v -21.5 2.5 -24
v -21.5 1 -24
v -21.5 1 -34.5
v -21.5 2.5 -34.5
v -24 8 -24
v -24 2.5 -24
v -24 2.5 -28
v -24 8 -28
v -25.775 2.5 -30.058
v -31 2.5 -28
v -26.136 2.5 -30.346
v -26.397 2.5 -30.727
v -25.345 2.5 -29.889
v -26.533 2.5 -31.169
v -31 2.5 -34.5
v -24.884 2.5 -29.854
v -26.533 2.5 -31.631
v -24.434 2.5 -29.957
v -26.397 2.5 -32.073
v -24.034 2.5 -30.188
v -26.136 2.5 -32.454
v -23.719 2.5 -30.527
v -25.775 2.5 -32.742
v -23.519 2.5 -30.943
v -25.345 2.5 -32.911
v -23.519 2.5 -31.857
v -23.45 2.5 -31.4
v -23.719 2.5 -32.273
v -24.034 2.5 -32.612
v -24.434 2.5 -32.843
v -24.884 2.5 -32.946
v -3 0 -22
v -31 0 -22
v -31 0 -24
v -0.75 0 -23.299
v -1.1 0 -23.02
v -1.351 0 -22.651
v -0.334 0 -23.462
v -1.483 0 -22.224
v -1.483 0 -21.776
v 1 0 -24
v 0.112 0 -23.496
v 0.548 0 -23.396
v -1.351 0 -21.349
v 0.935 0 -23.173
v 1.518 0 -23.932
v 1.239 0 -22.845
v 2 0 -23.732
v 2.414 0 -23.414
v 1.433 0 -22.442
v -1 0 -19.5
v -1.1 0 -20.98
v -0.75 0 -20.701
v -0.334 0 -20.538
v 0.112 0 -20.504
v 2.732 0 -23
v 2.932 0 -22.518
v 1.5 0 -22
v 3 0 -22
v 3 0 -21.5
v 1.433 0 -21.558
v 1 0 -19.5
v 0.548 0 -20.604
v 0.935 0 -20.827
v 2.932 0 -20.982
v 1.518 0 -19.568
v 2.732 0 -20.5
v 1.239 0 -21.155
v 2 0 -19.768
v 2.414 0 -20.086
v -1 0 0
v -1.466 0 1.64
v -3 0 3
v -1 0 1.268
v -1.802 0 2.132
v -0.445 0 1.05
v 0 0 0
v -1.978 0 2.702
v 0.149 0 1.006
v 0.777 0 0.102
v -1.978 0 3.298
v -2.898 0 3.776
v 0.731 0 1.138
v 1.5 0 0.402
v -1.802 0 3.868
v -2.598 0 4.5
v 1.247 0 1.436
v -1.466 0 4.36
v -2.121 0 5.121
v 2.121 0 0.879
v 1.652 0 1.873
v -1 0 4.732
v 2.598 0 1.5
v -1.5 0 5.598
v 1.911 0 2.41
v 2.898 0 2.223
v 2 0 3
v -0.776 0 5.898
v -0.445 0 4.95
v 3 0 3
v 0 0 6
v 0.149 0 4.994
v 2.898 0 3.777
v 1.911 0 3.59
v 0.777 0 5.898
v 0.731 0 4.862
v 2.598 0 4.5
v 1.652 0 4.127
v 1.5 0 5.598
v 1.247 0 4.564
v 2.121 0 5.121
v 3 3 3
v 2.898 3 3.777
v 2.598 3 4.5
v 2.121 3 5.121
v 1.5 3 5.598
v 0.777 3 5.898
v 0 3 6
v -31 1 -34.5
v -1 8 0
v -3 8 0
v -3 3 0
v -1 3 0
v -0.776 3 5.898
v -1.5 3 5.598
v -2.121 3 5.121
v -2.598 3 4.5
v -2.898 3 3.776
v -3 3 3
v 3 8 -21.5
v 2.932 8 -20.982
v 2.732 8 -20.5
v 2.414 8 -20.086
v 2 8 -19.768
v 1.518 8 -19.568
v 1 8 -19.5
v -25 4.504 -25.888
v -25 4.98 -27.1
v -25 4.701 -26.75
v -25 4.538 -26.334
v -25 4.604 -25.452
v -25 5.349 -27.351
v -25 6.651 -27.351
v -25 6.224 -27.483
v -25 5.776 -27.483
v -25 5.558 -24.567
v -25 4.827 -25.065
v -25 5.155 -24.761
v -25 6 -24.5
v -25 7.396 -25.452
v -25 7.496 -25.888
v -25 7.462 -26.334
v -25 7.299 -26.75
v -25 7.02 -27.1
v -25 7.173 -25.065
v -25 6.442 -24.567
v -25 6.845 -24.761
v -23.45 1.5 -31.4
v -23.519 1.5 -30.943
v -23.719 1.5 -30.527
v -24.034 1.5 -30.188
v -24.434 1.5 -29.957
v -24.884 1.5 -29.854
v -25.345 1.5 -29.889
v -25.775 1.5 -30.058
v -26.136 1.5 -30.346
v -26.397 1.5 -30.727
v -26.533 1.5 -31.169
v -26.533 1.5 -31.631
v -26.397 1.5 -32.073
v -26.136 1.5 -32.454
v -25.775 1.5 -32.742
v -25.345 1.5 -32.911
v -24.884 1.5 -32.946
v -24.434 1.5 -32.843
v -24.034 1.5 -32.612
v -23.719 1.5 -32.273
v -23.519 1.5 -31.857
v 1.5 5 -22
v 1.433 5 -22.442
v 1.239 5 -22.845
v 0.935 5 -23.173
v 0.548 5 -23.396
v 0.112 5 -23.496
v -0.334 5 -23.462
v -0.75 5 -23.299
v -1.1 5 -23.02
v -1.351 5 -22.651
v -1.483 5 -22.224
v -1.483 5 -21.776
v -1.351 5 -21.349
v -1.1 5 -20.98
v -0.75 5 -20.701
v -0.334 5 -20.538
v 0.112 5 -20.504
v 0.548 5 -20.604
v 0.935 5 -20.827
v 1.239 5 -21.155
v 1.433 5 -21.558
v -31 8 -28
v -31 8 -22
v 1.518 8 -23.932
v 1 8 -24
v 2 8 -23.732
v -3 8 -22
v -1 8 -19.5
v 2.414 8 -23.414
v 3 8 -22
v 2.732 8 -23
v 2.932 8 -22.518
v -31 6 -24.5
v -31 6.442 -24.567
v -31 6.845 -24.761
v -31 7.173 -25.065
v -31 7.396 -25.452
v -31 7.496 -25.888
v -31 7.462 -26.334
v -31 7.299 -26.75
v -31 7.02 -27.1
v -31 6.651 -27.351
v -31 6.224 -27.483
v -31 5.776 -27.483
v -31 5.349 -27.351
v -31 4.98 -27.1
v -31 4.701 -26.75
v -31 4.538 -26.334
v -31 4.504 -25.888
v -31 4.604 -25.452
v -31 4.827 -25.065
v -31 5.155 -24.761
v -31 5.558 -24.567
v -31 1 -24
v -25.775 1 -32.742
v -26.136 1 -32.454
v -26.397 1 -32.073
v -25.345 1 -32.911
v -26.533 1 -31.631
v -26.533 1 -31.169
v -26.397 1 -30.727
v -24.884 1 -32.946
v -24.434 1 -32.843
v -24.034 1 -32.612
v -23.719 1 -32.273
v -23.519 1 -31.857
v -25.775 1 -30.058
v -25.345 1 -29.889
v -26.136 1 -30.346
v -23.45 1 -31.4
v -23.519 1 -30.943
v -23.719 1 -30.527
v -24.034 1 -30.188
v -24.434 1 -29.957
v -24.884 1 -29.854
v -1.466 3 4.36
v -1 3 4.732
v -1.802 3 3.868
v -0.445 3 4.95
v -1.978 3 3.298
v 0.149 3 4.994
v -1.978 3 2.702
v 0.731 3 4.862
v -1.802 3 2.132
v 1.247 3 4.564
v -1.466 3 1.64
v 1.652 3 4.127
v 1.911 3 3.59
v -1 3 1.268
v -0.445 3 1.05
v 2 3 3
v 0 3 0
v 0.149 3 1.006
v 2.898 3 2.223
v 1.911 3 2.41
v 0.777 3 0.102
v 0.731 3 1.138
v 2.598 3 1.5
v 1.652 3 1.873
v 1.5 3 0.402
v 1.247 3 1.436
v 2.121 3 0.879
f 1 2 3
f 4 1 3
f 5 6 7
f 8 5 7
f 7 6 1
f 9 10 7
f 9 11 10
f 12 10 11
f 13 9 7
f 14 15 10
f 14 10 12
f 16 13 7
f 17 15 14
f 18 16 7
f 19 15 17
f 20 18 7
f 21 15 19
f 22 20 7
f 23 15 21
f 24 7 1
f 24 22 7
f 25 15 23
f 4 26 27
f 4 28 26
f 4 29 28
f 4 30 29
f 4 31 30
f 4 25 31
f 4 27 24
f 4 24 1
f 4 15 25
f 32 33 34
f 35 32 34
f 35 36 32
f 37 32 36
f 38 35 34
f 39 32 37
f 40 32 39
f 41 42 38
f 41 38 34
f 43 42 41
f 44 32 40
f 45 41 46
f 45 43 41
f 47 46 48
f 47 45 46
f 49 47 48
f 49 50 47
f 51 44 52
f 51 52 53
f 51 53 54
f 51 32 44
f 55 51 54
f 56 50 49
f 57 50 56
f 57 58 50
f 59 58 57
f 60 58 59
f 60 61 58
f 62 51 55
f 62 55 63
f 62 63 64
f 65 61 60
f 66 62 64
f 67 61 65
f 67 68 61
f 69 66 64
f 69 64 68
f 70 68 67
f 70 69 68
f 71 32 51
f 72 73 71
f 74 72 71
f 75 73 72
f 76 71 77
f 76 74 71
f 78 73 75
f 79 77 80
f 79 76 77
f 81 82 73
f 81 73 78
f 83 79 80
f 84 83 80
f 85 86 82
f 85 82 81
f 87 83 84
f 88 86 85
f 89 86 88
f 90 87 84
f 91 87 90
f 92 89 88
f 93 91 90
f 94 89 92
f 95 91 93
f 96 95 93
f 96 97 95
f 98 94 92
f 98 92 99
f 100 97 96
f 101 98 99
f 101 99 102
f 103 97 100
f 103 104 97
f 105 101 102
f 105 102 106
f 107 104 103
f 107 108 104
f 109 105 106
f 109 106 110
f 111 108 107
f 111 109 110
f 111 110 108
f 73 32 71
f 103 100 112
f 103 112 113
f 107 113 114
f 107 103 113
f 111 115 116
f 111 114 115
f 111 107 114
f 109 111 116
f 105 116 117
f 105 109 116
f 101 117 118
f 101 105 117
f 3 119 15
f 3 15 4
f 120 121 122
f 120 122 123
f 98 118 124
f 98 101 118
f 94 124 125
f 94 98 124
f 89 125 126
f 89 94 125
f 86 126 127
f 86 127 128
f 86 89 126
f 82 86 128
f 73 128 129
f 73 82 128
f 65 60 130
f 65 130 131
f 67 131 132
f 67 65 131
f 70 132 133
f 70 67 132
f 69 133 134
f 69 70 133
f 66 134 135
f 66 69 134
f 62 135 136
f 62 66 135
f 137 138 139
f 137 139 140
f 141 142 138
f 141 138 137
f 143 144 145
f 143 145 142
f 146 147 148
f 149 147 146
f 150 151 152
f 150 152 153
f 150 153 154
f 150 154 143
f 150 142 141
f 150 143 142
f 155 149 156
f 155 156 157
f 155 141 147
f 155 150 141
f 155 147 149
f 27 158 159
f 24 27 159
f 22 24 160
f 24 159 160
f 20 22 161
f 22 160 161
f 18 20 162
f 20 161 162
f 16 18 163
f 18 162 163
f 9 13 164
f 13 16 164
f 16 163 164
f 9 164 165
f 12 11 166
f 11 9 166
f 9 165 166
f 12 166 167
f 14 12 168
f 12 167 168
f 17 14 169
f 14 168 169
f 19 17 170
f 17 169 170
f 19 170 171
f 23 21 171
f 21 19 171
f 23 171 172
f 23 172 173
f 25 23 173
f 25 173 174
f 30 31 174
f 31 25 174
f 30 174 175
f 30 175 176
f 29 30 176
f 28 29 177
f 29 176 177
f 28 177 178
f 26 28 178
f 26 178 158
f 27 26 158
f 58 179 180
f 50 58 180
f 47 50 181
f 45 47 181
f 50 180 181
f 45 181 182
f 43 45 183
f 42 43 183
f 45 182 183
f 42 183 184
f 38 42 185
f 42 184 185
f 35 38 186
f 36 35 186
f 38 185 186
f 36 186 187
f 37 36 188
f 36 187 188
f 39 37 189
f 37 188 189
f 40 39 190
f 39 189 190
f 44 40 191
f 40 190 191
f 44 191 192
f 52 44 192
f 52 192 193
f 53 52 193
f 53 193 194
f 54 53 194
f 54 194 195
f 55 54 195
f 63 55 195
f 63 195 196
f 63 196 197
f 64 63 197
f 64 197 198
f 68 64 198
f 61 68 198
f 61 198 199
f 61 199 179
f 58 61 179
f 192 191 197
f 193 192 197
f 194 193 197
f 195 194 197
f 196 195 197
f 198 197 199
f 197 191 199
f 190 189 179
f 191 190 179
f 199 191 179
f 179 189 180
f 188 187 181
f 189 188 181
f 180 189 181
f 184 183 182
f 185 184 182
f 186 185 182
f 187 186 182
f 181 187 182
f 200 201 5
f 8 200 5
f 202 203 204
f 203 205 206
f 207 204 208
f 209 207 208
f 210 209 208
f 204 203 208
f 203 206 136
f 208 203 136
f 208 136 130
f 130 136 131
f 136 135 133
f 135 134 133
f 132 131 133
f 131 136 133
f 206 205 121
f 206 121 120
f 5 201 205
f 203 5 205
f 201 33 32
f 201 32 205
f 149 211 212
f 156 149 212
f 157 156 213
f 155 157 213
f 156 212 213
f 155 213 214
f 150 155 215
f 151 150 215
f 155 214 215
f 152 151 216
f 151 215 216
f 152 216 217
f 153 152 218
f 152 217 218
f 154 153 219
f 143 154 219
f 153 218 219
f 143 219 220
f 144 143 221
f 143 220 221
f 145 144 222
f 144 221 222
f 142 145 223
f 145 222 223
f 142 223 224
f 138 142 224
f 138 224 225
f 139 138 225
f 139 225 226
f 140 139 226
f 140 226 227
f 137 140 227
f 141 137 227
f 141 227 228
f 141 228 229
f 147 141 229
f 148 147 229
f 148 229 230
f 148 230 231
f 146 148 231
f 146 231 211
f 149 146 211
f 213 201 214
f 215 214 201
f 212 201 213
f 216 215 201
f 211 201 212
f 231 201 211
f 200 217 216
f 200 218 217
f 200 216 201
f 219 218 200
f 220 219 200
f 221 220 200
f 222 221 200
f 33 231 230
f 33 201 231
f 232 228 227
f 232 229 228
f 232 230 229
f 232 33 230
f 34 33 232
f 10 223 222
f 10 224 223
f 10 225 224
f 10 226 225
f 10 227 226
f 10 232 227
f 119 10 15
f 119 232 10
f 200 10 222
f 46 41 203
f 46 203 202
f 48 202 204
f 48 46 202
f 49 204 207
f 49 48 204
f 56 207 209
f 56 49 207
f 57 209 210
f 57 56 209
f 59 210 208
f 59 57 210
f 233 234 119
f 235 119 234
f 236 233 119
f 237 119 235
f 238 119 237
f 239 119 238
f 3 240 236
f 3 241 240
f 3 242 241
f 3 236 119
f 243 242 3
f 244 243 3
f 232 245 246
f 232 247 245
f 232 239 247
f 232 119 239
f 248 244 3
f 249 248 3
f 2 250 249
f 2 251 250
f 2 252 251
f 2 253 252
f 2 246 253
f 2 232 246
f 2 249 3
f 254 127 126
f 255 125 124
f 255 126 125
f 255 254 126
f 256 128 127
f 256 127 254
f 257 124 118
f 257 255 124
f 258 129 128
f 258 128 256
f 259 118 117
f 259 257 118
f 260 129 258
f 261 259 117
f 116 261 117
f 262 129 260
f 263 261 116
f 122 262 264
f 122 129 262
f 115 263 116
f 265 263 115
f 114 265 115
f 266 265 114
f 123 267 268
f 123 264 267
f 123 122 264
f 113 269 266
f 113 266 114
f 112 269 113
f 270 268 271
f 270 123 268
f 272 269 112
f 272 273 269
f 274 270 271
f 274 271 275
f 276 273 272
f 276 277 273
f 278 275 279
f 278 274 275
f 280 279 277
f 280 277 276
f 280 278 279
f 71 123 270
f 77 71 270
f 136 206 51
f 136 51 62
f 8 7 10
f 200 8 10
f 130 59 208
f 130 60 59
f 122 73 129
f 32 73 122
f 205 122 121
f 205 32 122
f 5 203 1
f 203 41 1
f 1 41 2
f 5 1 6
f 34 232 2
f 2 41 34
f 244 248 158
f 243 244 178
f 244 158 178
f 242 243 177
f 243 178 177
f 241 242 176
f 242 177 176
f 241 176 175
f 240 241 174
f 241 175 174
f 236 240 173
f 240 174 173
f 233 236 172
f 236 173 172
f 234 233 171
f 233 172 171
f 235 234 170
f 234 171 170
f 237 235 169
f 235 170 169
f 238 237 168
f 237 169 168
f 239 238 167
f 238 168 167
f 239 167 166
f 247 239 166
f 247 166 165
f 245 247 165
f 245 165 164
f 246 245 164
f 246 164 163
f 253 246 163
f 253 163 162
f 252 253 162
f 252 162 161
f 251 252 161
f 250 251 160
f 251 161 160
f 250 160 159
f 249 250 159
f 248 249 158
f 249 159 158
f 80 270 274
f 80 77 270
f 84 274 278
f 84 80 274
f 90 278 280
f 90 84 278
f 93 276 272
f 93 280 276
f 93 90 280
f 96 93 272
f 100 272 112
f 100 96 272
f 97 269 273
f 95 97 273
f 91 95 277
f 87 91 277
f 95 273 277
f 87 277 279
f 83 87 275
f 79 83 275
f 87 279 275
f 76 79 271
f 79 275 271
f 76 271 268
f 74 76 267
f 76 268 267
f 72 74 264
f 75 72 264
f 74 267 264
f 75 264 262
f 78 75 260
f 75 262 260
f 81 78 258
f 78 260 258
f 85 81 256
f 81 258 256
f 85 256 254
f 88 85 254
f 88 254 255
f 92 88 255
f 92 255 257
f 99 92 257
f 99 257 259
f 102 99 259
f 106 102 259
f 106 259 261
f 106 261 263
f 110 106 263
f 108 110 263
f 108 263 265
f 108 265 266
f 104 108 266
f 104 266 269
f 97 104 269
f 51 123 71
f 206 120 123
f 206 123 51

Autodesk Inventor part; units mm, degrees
ref_plane "YZ Plane" through (0, 0, 0) normal (1, 0, 0) x (0, 1, 0)
ref_plane "XZ Plane" through (0, 0, 0) normal (0, 1, 0) x (-1, 0, 0)
ref_plane "XY Plane" through (0, 0, 0) normal (0, 0, 1) x (1, 0, 0)
sketch "Szkic1" plane through (0, 0, 0) normal (0, 1, 0) x (-1, 0, 0)
  line L0 (0, 0) -> (3, 0)
  line L1 (3, 0) -> (3, -25)
  line L2 (3, -25) -> (0, -25)
  line L3 (0, -25) -> (0, 0)
  line L4 (3, -25) -> (31, -25)
  line L5 (31, -25) -> (31, -22)
  line L6 (31, -22) -> (3, -22)
  line L7 (3, -22) -> (3, -25)
  point P0 (3, -22)
  dimension "d0" = 3
  dimension "d1" = 25
  dimension "d2" = 28
  dimension "d3" = 3
extrude "Wyciągnięcie proste1" add sketch "Szkic1" along normal blind 8
sketch "Szkic2" plane through (0, 0, 0) normal (1, 0, 0) x (0, 0, -1)
  line L0 (0, 0) -> (0, 8) projected
  line L1 (0, 8) -> (5, 8)
  line L2 (5, 8) -> (5, 0)
  line L3 (5, 0) -> (0, 0)
  line L4 (0, 0) -> (0, 8)
  dimension "d6" = 5
  dimension "d7" = 8
extrude "Wyciągnięcie proste2" add sketch "Szkic2" along normal blind 3
sketch "Szkic6" plane through (0, 8, 0) normal (0, 1, 0) x (1, 0, 0)
  line L0 (-31, 22) -> (-3, 22) projected
  line L1 (0, 25) -> (-31, 25) projected
  line L2 (-3, 22) -> (0, 22)
  line L3 (0, 22) -> (0, 25)
  line L4 (0, 25) -> (-3, 25)
  line L5 (-3, 25) -> (-3, 22)
  line L6 (-3, 25) -> (3, 25)
  line L7 (3, 25) -> (3, 19)
  line L8 (3, 19) -> (-3, 19)
  line L9 (-3, 19) -> (-3, 25)
  point P0 (0, 0)
  dimension "d19" = 6
  dimension "d20" = 6
extrude "Wyciągnięcie proste6" add sketch "Szkic6" against normal blind 8 contours L6 L7 L8 L9 L2 L3
sketch "Szkic7" plane through (0, 8, 0) normal (0, 1, 0) x (1, 0, 0)
  line L0 (3, 19) -> (3, 25) projected
  line L1 (-31, 25) -> (3, 25) projected
  line L2 (-3, 22) -> (-3, 0) projected
  circle A0 centre (0, 22) radius 1.5
  point P0 (0, 0)
  dimension "d23" = 3
  dimension "d42" = 3
  dimension "d43" = 3
extrude "Wyciągnięcie proste7" cut sketch "Szkic7" against normal blind 8
sketch "Szkic8" plane through (0, 8, 0) normal (0, 1, 0) x (1, 0, 0)
  circle A0 centre (0, 22) radius 1.5 projected
  circle A1 centre (0, 22) radius 2
  point P0 (0, 0)
extrude "Wyciągnięcie proste8" add sketch "Szkic8" against normal blind 3 contours A0
sketch "Szkic9" plane through (0, 8, 0) normal (0, 1, 0) x (1, 0, 0)
  line L0 (-31, 25) -> (-31, 22) projected
  line L1 (3, 19) -> (3, 25) projected
  line L2 (-31, 25) -> (3, 25)
  line L3 (3, 25) -> (3, 24)
  line L4 (3, 24) -> (-31, 24)
  line L5 (-31, 24) -> (-31, 25)
  point P0 (0, 0)
  dimension "d28" = 1
extrude "Wyciągnięcie proste9" cut sketch "Szkic9" against normal blind 8
sketch "Szkic10" plane through (0, 0, -5) normal (0, 0, -1) x (-1, 0, 0)
  line L0 (0, 0) -> (0, 8) projected
  line L1 (-3, 8) -> (-3, 0) projected
  line L2 (0, 0) -> (-3, 0)
  line L3 (-3, 0) -> (-3, 8)
  line L4 (-3, 8) -> (0, 8)
  line L5 (0, 8) -> (0, 0)
  point P0 (-3, 0)
extrude "Wyciągnięcie proste10" cut sketch "Szkic10" against normal blind 3.7
sketch "Szkic11" plane through (0, 8, -19) normal (0, 0, 1) x (1, 0, 0)
  line L0 (-3, 0) -> (3, 0) projected
  line L1 (3, -8) -> (0, -8) projected
  line L2 (0, 0) -> (3, 0)
  line L3 (3, 0) -> (3, -8)
  line L4 (3, -8) -> (0, -8)
  line L5 (0, -8) -> (0, 0)
extrude "Wyciągnięcie proste11" cut sketch "Szkic11" against normal blind 0.5
sketch "Szkic12" plane through (3, 8, -24) normal (0, 0, -1) x (-1, 0, 0)
  line L0 (0, -8) -> (0, 0) projected
  line L1 (6, 0) -> (0, 0) projected
  line L2 (0, -8) -> (6, -8)
  line L3 (6, -8) -> (6, 0)
  line L4 (6, 0) -> (0, 0)
  line L5 (0, 0) -> (0, -8)
  point P0 (3, -8)
extrude "Wyciągnięcie proste12" add sketch "Szkic12" along normal blind 0.5
sketch "Szkic13" plane through (0, 0, -1.3) normal (1, 0, 0) x (0, 0, -1)
  line L0 (0, 0) -> (18.2, 0) projected
  line L1 (0, 8) -> (18.2, 8) projected
  line L2 (0, 0) -> (18.2, 0)
  line L3 (18.2, 0) -> (18.2, 8)
  line L4 (18.2, 8) -> (0, 8)
  line L5 (0, 8) -> (0, 0)
  point P0 (-1.3, 0)
  point P1 (18.2, 0)
extrude "Wyciągnięcie proste13" cut sketch "Szkic13" against normal blind 1
sketch "Szkic14" plane through (3, 8, -24.5) normal (0, 0, -1) x (-1, 0, 0)
  line L0 (4, 0) -> (0, 0) projected
  line L1 (6, -8) -> (6, 0) projected
  line L2 (0, 0) -> (6, 0)
  line L3 (6, 0) -> (6, -8)
  line L4 (6, -8) -> (0, -8)
  line L5 (0, -8) -> (0, 0)
  point P0 (3, -8)
extrude "Wyciągnięcie proste14" cut sketch "Szkic14" against normal blind 0.5
sketch "Szkic15" plane through (-3, 0, 0) normal (0, 0, 1) x (1, 0, 0)
  line L0 (6, 8) -> (6, 0) projected
  line L1 (0, 0) -> (0, 8) projected
  line L2 (6, 8) -> (0, 8)
  line L3 (0, 8) -> (0, 0)
  line L4 (0, 0) -> (6, 0)
  line L5 (6, 0) -> (6, 8)
  point P0 (3, 0)
extrude "Wyciągnięcie proste15" add sketch "Szkic15" along normal blind 4.7
sketch "Szkic16" plane through (3, 0, 0) normal (1, 0, 0) x (0, 0, -1)
  line L0 (-4.7, 8) -> (-4.7, 0) projected
  line L1 (1.3, 0) -> (1.3, 8) projected
  line L2 (-4.7, 0) -> (1.3, 0)
  line L3 (1.3, 0) -> (1.3, 8)
  line L4 (1.3, 8) -> (-4.7, 8)
  line L5 (-4.7, 8) -> (-4.7, 0)
  point P0 (0, 0)
extrude "Wyciągnięcie proste16" cut sketch "Szkic16" against normal blind 4
sketch "Szkic17" plane through (0, 8, 0) normal (0, 1, 0) x (1, 0, 0)
  line L0 (-1, 19.5) -> (-1, -4.7) projected
  line L1 (-3, -4.7) -> (-1, -4.7)
  line L2 (-1, -4.7) -> (-1, 0)
  line L3 (-1, 0) -> (-3, 0)
  line L4 (-3, 0) -> (-3, -4.7)
  line L5 (-3, 0) -> (3, 0)
  line L6 (3, 0) -> (3, -6)
  line L7 (3, -6) -> (-3, -6)
  line L8 (-3, -6) -> (-3, 0)
  point P0 (0, 0)
  dimension "d48" = 6
  dimension "d49" = 6
extrude "Wyciągnięcie proste17" cut sketch "Szkic17" against normal blind 5
sketch "Szkic18" plane through (0, 3, 0) normal (0, 1, 0) x (1, 0, 0)
  line L0 (-3, 0) -> (-1, 0) projected
  line L1 (-3, 0) -> (3, 0)
  line L2 (3, 0) -> (3, -6)
  line L3 (3, -6) -> (-3, -6)
  line L4 (-3, -6) -> (-3, 0)
  point P0 (0, 0)
  dimension "d52" = 6
  dimension "d53" = 6
extrude "Wyciągnięcie proste18" add sketch "Szkic18" against normal blind 3
sketch "Szkic19" plane through (0, 3, 0) normal (0, 1, 0) x (1, 0, 0)
  circle A0 centre (0, -3) radius 2
  line L0 (-3, -6) -> (-3, 0) projected
  line L1 (-3, -6) -> (3, -6) projected
  point P0 (0, 0)
  dimension "d56" = 4
  dimension "d57" = 3
  dimension "d58" = 3
extrude "Wyciągnięcie proste19" cut sketch "Szkic19" against normal blind 3
sketch "Szkic20" plane through (-31, 0, -22) normal (0, 0, 1) x (1, 0, 0)
  line L0 (34, 8) -> (0, 8) projected
  line L1 (0, 8) -> (7, 8)
  line L2 (7, 8) -> (7, 4)
  line L3 (7, 4) -> (0, 4)
  line L4 (0, 4) -> (0, 8)
  point P0 (31, 0)
  point P1 (7, 8)
  dimension "d61" = 7
  dimension "d62" = 4
extrude "Wyciągnięcie proste20" add sketch "Szkic20" along normal blind 4
sketch "Szkic21" plane through (-31, 0, -24) normal (-1, 0, 0) x (0, 0, 1)
  circle A0 centre (4, 6) radius 1.5
  line L0 (6, 8) -> (6, 4) projected
  line L1 (2, 4) -> (6, 4) projected
  point P0 (24, 0)
  point P1 (4, 4)
  dimension "d65" = 3
  dimension "d66" = 2
  dimension "d67" = 2
extrude "Wyciągnięcie proste21" cut sketch "Szkic21" against normal blind 6
sketch "Szkic22" plane through (3, 8, -24) normal (0, 0, -1) x (-1, 0, 0)
  line L0 (34, 0) -> (34, -8) projected
  line L1 (34, 0) -> (27, 0)
  line L2 (27, 0) -> (27, -4)
  line L3 (27, -4) -> (34, -4)
  line L4 (34, -4) -> (34, 0)
  point P0 (3, -8)
  dimension "d70" = 7
  dimension "d71" = 4
extrude "Wyciągnięcie proste22" add sketch "Szkic22" along normal blind 4
sketch "Szkic23" plane through (-31, 0, -24) normal (-1, 0, 0) x (0, 0, 1)
  circle A0 centre (-2, 6) radius 1.5
  line L0 (-4, 8) -> (6, 8) projected
  line L1 (-4, 4) -> (-4, 8) projected
  line L2 (2, 0) -> (2, 8) projected
  line L3 (6, 8) -> (2, 8)
  line L4 (2, 8) -> (2, 4)
  line L5 (2, 4) -> (6, 4)
  line L6 (6, 4) -> (6, 8)
  point P0 (24, 0)
  point P1 (-4, 6)
  dimension "d74" = 3
  dimension "d75" = 2
  dimension "d76" = 2
extrude "Wyciągnięcie proste23" cut sketch "Szkic23" against normal blind 7 contours L0 L6 L5 L2
extrude "Wyciągnięcie proste24" cut sketch "Szkic23" against normal blind 6 contours A0
sketch "Sketch24" plane through (3, 0, -24) normal (0, 0, -1) x (-1, 0, 0)
  line L0 (34, 4) -> (27, 4) projected
  line L1 (27, 4) -> (27, 8) projected
  line L2 (0, 8) -> (27, 8) projected
  line L3 (0, 0) -> (0, 8) projected
  line L4 (34, 0) -> (0, 0) projected
  line L5 (34, 4) -> (34, 0) projected
  point P0 (3, 0)
extrude "Extrusion25" add sketch "Sketch24" along normal blind 0.5
sketch "Szkic25" plane through (3, 0, -24.5) normal (0, 0, -1) x (-1, 0, 0)
  line L0 (27, 4) -> (34, 4) projected
  line L1 (27, 8) -> (27, 4) projected
  line L2 (27, 8) -> (0, 8) projected
  line L3 (0, 8) -> (0, 0) projected
  line L4 (0, 0) -> (34, 0) projected
  line L5 (34, 0) -> (34, 4) projected
  point P0 (3, 0)
extrude "Wyciągnięcie proste26" cut sketch "Szkic25" against normal blind 0.5
sketch "Szkic26" plane through (3, 0, -24) normal (0, 0, -1) x (-1, 0, 0)
  line L0 (34, 0) -> (6, 0) projected
  line L1 (34, 0) -> (24.5, 0)
  line L2 (24.5, 0) -> (24.5, 1.5)
  line L3 (24.5, 1.5) -> (34, 1.5)
  line L4 (34, 1.5) -> (34, 0)
  point P0 (3, 0)
  point P1 (24.5, 0)
  dimension "d85" = 9.5
  dimension "d86" = 1.5
extrude "Wyciągnięcie proste27" add sketch "Szkic26" along normal blind 10.5
sketch "Szkic27" plane through (-31, 1.5, -24) normal (0, 1, 0) x (1, 0, 0)
  circle A0 centre (6, 7.4) radius 1.55
  line L0 (7, 0) -> (0, 0) projected
  line L1 (0, 0) -> (0, 10.5) projected
  point P0 (31, -24)
  point P1 (0, 5.25)
  dimension "d89" = 3.1
  dimension "d90" = 7.4
  dimension "d91" = 6
extrude "Wyciągnięcie proste28" cut sketch "Szkic27" against normal blind 2
fillet "Fillet1" radius 3 2 edges at (3, 1.5, 0) (3, 1.5, 6)
fillet "Fillet2" radius 2 2 edges at (3, 4, -19.5) (3, 4, -24)
fillet "Zaokrąglenie3" radius 3 1 edges at (-3, 1.5, 6)
sketch "Szkic28" plane through (-31, 1.5, -24) normal (0, 1, 0) x (1, 0, 0)
  line L0 (0, -2) -> (28, -2) projected
  line L1 (0, 0) -> (0, 4) projected
  line L2 (7, 4) -> (0, 4) projected
  line L3 (7, 0) -> (7, 4) projected
  line L4 (7, 0) -> (0, 0) projected
  point P0 (31, -24)
extrude "Wyciągnięcie proste29" add sketch "Szkic28" along normal blind 2.5
sketch "Szkic29" plane through (-24, 1.5, -24) normal (0, 1, 0) x (1, 0, 0)
  line L0 (-7, 4) -> (0, 4) projected
  line L1 (0, 4) -> (0, 0) projected
  line L2 (2.5, 0) -> (0, 0) projected
  line L3 (2.5, 0) -> (2.5, 10.5) projected
  line L4 (-7, 10.5) -> (2.5, 10.5) projected
  line L5 (-7, 4) -> (-7, 10.5) projected
  circle A0 centre (-1, 7.4) radius 1.55 projected
  point P0 (24, -24)
extrude "Wyciągnięcie proste30" add sketch "Szkic29" along normal blind 1
sketch "Szkic30" plane through (0, 0, 0) normal (0, -1, 0) x (1, 0, 0)
  line L0 (-24, -28) -> (-31, -28) projected
  line L1 (-24, -24) -> (-24, -28) projected
  line L2 (-21.5, -24) -> (-24, -24) projected
  line L3 (-21.5, -24) -> (-21.5, -34.5) projected
  line L4 (-21.5, -34.5) -> (-31, -34.5) projected
  line L5 (-31, -34.5) -> (-31, -28) projected
  circle A0 centre (-25, -31.4) radius 1.55 projected
  point P0 (0, 0)
extrude "Wyciągnięcie proste31" cut sketch "Szkic30" against normal blind 1
sketch "Szkic31" plane through (0, 0, 0) normal (0, -1, 0) x (1, 0, 0)
  line L0 (-24, -24) -> (1, -24) projected
  line L1 (-31, -28) -> (-31, -22) projected
  line L2 (-24, -24) -> (-31, -24)
  line L3 (-31, -24) -> (-31, -25.3)
  line L4 (-31, -25.3) -> (-24, -25.3)
  line L5 (-24, -25.3) -> (-24, -24)
  line L6 (-24, -28) -> (-24, -24) projected
  line L7 (-24, -28) -> (-31, -28)
  line L8 (-31, -28) -> (-31, -25.3)
  line L9 (-31, -25.3) -> (-24, -25.3)
  line L10 (-24, -25.3) -> (-24, -28)
  point P0 (0, 0)
  dimension "d103" = 1.3
extrude "Wyciągnięcie proste32" cut sketch "Szkic31" against normal blind 1
properties part number "prawascianakolo" material "Tworzywo sztuczne PET"
